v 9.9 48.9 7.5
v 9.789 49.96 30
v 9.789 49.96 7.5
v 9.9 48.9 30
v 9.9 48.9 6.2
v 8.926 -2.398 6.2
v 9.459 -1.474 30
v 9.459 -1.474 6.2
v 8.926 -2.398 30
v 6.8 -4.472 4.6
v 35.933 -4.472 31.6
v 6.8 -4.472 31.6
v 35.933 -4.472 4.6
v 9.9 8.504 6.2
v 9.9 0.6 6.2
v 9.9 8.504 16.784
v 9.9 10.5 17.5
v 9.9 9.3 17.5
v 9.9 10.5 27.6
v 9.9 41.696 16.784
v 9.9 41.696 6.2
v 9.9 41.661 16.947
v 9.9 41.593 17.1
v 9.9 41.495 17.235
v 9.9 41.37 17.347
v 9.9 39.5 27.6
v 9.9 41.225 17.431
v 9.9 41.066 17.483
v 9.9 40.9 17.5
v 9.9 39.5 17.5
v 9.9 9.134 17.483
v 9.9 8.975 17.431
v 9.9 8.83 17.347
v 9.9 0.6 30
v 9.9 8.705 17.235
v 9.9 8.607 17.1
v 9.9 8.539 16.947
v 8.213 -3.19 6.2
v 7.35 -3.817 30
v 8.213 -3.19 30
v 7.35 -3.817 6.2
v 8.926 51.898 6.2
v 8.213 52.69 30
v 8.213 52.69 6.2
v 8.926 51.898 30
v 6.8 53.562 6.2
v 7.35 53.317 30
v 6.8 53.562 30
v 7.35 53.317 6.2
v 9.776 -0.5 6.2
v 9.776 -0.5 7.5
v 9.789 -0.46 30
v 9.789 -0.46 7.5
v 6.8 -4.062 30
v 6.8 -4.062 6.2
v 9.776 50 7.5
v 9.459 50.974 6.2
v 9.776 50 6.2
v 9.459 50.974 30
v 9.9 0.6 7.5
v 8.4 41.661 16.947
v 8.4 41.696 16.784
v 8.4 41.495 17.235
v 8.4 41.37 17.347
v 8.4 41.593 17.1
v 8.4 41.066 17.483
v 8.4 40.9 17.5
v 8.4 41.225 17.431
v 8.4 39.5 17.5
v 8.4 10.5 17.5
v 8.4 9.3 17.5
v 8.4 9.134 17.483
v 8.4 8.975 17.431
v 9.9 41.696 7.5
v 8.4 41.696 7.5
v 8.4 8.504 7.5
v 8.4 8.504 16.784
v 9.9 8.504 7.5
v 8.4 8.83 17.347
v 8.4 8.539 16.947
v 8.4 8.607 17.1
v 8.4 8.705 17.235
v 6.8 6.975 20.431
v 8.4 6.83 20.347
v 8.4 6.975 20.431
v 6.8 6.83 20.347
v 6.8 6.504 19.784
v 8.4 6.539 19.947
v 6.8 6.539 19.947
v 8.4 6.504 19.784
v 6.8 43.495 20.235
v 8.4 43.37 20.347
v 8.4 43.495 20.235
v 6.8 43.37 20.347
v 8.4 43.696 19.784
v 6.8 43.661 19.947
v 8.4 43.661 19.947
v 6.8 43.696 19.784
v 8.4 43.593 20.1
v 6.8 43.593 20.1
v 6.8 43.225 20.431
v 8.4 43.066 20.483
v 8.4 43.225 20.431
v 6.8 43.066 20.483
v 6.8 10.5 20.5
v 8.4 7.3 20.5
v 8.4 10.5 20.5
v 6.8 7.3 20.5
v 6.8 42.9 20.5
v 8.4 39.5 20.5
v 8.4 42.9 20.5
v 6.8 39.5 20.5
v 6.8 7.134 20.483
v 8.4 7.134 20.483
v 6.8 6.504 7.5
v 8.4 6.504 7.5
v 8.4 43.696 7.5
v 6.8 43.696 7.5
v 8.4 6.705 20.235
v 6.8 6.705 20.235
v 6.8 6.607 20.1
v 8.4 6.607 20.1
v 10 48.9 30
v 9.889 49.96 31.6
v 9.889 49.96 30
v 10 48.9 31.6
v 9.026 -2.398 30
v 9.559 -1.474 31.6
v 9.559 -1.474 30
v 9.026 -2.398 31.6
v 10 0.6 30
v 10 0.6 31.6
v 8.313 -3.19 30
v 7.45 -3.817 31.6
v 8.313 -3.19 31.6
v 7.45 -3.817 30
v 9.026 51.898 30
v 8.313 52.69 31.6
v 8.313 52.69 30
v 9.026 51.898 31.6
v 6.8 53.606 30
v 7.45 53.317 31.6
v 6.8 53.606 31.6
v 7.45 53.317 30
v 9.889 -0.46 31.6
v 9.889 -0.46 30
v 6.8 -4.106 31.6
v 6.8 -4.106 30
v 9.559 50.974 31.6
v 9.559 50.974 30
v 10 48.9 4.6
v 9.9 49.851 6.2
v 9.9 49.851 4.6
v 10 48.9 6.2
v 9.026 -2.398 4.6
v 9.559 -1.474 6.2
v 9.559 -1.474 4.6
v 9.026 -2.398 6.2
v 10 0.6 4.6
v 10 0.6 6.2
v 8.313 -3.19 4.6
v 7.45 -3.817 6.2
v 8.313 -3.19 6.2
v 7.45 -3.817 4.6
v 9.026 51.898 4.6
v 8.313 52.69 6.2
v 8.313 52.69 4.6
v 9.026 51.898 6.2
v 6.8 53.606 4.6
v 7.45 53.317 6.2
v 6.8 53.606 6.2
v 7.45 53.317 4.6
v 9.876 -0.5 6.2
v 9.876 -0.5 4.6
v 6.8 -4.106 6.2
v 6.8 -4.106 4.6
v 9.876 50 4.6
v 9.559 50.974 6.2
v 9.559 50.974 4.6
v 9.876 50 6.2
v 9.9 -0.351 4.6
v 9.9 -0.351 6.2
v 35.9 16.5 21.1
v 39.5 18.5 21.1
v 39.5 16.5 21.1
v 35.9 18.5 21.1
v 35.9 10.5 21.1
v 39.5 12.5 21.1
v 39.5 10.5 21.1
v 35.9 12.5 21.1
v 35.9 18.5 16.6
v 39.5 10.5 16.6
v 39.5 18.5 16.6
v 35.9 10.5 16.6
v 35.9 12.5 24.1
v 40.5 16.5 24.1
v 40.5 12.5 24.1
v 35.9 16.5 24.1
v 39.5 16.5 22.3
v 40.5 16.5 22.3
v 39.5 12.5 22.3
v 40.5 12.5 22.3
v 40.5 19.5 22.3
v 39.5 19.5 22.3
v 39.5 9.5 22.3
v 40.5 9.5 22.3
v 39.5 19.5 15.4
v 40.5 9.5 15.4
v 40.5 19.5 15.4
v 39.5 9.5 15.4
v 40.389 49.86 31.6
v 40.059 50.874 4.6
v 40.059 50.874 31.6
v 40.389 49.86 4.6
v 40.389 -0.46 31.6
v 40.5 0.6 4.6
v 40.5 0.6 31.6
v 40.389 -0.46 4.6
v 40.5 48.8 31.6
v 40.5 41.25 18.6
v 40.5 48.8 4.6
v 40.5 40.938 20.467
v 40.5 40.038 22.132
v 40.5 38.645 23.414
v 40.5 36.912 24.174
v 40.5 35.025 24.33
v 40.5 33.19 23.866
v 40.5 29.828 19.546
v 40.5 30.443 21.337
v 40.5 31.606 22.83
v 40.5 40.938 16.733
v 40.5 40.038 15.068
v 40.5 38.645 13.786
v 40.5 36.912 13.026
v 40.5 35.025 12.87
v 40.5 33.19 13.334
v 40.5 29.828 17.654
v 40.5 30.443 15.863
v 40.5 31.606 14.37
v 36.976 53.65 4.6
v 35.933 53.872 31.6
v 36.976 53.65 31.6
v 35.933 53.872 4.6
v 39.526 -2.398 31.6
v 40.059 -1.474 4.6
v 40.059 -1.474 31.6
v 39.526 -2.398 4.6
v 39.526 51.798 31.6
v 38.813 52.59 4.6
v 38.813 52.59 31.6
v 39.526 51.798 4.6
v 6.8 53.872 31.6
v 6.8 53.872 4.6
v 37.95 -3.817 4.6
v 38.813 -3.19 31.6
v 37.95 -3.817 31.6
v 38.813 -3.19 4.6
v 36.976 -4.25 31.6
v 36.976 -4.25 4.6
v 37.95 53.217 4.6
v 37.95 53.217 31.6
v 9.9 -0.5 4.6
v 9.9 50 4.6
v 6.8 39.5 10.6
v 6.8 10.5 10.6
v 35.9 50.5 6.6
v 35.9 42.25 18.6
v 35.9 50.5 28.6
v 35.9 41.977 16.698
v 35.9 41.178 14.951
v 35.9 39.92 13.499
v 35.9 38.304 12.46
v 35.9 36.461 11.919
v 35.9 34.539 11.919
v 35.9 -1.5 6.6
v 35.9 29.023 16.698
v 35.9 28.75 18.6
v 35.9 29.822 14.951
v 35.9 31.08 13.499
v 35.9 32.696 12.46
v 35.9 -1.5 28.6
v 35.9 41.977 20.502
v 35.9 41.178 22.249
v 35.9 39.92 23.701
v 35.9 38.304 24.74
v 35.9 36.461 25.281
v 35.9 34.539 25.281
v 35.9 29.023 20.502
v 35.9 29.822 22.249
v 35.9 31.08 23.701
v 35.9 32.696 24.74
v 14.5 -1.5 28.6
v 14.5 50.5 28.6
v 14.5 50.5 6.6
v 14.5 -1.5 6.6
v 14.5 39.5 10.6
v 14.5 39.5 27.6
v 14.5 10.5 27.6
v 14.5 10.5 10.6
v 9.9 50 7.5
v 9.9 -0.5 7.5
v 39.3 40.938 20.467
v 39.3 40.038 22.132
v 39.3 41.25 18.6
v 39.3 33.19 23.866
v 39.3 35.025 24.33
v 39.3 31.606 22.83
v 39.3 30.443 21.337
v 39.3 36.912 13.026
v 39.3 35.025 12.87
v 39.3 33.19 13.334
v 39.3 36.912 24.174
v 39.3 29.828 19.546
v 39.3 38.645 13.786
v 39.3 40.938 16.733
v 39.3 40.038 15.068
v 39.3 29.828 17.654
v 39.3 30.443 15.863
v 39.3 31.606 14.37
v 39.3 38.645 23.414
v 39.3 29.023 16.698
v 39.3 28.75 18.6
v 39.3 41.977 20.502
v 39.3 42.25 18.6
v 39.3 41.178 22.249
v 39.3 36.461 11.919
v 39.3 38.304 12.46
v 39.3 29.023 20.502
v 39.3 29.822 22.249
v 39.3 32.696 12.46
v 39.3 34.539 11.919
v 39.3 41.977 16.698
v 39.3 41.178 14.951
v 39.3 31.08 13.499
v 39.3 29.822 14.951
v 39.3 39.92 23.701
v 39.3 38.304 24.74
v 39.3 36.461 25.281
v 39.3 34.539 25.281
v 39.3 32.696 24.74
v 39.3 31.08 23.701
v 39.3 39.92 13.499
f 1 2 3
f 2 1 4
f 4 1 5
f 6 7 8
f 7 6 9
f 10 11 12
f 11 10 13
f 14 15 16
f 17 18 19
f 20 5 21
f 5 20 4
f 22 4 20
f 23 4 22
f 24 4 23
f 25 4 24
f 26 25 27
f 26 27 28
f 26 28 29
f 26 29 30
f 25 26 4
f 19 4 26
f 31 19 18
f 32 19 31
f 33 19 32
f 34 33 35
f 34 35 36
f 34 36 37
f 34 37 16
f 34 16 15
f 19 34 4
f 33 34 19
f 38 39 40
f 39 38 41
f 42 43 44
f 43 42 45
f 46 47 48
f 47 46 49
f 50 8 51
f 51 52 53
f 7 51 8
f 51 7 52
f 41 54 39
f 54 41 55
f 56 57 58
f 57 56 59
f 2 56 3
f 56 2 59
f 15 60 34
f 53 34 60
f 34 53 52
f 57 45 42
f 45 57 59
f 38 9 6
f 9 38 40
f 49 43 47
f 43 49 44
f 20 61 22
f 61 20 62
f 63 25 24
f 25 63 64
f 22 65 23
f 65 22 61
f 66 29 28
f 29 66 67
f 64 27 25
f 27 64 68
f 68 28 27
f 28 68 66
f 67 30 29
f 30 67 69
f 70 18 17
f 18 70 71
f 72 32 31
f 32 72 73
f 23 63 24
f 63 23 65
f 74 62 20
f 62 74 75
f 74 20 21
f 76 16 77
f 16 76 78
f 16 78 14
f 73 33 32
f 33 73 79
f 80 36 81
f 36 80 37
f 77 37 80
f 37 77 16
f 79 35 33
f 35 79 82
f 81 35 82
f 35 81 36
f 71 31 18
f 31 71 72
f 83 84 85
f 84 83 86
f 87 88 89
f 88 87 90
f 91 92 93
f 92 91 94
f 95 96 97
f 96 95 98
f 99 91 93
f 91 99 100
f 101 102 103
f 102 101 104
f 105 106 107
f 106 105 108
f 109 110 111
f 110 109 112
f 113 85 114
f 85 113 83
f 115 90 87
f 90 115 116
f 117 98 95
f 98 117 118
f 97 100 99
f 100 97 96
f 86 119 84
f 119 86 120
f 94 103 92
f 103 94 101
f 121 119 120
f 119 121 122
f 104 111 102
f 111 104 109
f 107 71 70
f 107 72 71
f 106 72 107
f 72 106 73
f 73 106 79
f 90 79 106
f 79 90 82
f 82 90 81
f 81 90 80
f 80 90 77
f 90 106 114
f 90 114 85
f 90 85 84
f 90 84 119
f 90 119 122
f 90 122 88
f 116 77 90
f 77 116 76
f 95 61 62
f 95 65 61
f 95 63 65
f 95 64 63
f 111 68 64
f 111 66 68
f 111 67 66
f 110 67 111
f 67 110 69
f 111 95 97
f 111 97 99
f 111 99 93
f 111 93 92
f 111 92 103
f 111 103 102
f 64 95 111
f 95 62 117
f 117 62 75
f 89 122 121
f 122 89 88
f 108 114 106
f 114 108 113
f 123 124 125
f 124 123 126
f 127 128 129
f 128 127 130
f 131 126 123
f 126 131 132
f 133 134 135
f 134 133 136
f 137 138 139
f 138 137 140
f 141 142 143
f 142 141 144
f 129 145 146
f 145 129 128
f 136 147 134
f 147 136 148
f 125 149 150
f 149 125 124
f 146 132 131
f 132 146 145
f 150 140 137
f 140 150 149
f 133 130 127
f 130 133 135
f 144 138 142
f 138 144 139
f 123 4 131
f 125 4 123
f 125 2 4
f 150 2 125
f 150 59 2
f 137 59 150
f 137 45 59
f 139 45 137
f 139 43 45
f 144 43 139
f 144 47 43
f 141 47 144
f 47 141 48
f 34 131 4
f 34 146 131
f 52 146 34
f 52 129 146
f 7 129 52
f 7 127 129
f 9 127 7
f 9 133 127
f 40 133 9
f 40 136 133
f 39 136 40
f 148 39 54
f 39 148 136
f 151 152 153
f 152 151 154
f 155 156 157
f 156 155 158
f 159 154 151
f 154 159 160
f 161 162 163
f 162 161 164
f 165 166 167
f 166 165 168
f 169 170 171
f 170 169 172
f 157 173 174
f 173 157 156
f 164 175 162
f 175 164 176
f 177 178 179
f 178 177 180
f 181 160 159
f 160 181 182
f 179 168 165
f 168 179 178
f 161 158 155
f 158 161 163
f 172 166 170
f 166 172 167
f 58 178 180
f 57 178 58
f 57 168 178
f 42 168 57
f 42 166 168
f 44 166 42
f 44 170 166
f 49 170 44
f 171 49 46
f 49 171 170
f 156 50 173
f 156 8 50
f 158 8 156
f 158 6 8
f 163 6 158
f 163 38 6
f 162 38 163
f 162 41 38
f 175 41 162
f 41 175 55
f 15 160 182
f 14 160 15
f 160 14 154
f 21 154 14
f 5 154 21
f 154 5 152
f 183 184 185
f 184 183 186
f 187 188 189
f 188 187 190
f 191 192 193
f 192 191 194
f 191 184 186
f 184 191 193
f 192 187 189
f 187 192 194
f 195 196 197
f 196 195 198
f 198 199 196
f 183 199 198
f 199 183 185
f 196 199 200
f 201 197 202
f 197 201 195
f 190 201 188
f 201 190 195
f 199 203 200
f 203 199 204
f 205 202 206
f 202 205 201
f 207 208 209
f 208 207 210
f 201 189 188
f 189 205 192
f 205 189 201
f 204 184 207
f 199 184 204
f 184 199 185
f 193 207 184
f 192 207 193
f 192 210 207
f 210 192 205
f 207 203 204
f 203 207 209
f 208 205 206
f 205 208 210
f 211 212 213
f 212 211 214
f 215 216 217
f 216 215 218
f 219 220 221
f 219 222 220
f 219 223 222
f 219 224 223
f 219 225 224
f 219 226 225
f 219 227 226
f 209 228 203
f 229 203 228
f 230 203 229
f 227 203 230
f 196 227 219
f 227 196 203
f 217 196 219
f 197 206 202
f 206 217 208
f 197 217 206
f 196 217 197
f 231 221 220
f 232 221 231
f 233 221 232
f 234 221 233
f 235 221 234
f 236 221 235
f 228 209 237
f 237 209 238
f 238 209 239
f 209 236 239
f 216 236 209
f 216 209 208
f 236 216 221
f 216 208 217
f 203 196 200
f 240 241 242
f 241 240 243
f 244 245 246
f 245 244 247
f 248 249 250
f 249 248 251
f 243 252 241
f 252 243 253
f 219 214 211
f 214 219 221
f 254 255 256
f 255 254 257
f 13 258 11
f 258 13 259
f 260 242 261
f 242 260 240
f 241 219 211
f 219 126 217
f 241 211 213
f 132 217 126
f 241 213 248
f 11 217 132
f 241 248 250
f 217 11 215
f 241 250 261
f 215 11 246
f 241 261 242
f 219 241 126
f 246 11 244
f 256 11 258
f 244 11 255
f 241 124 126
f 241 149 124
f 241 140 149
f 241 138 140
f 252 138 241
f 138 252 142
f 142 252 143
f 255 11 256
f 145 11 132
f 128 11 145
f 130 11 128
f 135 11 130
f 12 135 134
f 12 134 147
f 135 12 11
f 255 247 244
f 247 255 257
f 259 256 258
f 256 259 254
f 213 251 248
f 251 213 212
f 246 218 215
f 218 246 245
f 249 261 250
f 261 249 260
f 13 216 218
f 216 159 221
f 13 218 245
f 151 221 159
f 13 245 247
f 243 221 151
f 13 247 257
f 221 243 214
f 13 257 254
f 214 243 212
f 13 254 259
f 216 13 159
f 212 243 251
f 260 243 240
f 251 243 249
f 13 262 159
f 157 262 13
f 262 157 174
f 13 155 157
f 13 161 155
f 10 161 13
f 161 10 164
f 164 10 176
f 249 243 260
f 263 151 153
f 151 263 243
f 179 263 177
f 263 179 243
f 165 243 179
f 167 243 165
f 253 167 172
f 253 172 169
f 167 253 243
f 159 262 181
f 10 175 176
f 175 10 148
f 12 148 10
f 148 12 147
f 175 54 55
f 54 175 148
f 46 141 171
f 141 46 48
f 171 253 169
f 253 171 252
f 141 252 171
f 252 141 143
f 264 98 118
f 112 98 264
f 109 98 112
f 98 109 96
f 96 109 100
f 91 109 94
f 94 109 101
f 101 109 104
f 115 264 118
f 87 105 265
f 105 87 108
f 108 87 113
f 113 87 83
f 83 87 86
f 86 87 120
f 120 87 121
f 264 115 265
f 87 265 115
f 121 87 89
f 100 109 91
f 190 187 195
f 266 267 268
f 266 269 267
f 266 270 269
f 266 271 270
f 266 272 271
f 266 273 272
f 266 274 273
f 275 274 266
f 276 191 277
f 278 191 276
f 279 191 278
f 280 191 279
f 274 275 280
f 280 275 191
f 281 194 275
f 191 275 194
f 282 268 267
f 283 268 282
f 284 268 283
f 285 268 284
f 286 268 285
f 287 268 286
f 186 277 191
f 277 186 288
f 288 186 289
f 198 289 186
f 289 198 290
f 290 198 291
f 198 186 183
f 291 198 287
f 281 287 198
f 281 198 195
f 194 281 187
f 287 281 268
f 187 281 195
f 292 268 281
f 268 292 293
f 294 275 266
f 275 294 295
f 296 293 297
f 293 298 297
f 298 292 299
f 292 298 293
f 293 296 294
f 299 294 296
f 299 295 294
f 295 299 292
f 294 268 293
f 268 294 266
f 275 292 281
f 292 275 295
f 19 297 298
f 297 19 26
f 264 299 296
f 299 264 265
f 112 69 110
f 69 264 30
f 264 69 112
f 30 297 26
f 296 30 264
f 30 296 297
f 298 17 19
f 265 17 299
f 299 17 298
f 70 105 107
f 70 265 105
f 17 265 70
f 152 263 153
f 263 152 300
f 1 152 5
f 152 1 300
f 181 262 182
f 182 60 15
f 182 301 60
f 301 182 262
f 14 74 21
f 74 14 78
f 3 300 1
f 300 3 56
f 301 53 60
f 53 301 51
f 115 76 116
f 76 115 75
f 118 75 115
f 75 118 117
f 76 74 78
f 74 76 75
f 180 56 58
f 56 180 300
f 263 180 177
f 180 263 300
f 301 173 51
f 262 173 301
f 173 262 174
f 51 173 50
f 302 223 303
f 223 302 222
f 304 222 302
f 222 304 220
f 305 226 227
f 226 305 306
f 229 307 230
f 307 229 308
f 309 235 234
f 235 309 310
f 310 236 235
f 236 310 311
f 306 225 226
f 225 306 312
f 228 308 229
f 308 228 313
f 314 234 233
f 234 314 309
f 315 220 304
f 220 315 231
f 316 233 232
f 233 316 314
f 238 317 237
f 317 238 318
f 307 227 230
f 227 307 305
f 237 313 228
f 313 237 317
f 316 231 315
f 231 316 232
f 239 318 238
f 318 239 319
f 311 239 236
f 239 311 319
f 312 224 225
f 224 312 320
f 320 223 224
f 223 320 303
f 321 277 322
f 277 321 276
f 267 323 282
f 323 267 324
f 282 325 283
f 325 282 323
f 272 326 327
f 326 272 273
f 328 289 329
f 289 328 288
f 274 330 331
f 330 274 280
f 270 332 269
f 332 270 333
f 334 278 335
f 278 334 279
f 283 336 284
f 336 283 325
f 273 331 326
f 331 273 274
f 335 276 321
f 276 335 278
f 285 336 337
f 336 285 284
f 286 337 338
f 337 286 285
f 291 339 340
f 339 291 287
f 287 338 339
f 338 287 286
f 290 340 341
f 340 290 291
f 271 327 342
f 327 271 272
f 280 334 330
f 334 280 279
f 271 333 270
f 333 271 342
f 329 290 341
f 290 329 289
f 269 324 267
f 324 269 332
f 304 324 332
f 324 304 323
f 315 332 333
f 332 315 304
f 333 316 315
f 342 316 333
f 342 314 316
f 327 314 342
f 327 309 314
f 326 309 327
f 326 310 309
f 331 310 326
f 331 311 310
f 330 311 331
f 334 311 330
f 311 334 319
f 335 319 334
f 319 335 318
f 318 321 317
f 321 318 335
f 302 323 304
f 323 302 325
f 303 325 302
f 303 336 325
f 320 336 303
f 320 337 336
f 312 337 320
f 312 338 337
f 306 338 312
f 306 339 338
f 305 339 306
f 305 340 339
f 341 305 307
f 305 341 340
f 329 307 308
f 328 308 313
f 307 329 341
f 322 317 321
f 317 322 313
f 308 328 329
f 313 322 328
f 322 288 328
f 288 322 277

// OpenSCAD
// file: wled_shield_case.scad
/*
  All components for the wled shield case
*/
// Rednerquality 0.01 for print 0.9 for dev
$fs = 0.01;

use <_item_lid.scad>;
translate([4,4,0])
lid();

use <_item_case.scad>;
translate([-4,4,0])
case();

use <_item_wirebox.scad>;
translate([-40,-55,-4])

wirebox();
// file: _item_lid.scad
/*
 The lid for the case
*/
use <cuberounded.scad>

module picker(stick=false){
  translate([8.5,2.5,8])
  union(){
    rotate([180,0,0])
    cylinder(4.5,1.8,0.5);
    
    if (stick){
      translate([0,0,-2.5])
      cylinder(h=24.0,r=2.3);
      
      translate([0,0,17.5])
      cylinder(h=4.1,r=5.3);
    }
  }
}

module anchor(m=false,length=10.2,size=3.5){
  difference(){
    cube([length-0.2,size-0.2,size-0.2]);

    translate([m?length:-0.1,m?0:size-0.1,m?0:-0.1])
    rotate([m?0:180,-90,0])
    linear_extrude(length)
    polygon(points=[[0,0],[size,size],[0,size]],paths=[[0,1,2]],convexity=1);
  }
}


module opener(){
  cube([11,4,2.3]);
  
  translate([0,53,-0.1])
  cube([11,5,2.3]);
}

module snaphelper(){
  translate([20,3.4,-1.3])
  union(){
    cube([9.8,48.4,2.5]);
    
    translate([25,0,0])
    cube([9.8,48.4,2.5]);
  }
}

module backlid_snapins(){
  translate([20,1.4,-1.3])
  union(){
    backlid_snapinset_rl();
    
    translate([25,0,0])
    backlid_snapinset_rl();
  }
}

module backlid_snapinset_rl(){
  anchor();
  
  translate([0,50.1,0])
  anchor(m=true);
}

module prelid(){
  translate([2.6,2.6,-7.5])
  difference(){
    cuberounded([71.1,50,5],4.1);
    
    translate([-0.1,-0.1,-8.8])
    cube([72,52,12.2]);
    
    translate([65,32,4])
    rotate([180,0,0])
    linear_extrude(2)
    text("WLED",15,font="Liberation Sans:style=Bold",halign="right");
  }
  
  backlid_snapins();
  
  color("azure",0.15)
  snaphelper();
  
  translate([0,0,-28.6])
  difference(){
    cuberounded([76,54.5,27],5.1);
    
    translate([-0.1,-0.1,-2])
    cuberounded([76.2,54.7,27],5.1);
    
    translate([19.5,-0.2,24.9])
      union(){
        opener();
        
        translate([25,0,0])
        opener();
      }
  }
}

module lid(){
  translate([0,0.1,4])
  difference(){
    prelid();
    
    translate([4.2,4.2,5])
    cuberounded([68,46,2],5.1);
  }
}

lid();
// file: cuberounded.scad
module cuberounded(size=[1,1,1],radius=1,xonly=false){
  size=(size[0]==undef)?[size,size,size]:size;
  
  translate_min=radius;
  translate_xmax=size[0]-radius;
  translate_ymax=size[1]-radius;
  translate_zmax=size[2]-radius;
  
  hull()
  for (translate_x=[translate_min,translate_xmax]){
    for (translate_y=[translate_min,translate_ymax]){
      for (translate_z=[translate_min,translate_zmax]){
        translate([translate_x,translate_y,translate_z])
        rotate((xonly==true)?[0,90,0]:[0,0,0])
        cylinder(h=radius*2,r=radius,center=true);
      }
    }
  }
}

include <wled_shield_case.scad>
// file: _item_case.scad
/*
 The box for the first versions of wled shield case
*/
use <_item_lid.scad>
use <cuberounded.scad>

module sidestickholder(){
  translate([5,-1,7.5])
  cube([6.5,2,18.5]);
  
  translate([62.7,-1,6.4])
  cube([5,2,19]);
}

module pickers(sticks=false){
  picker(sticks);

  translate([0,41.2,0])
  picker(sticks);

  translate([56.2,0.2,0])
  picker(sticks);

  translate([56.2,41.2,0])
  picker(sticks);
}

module picker(stick=false){
  translate([8.5,2.5,8])
  union(){
    rotate([180,0,0])
    cylinder(4.5,1.8,0.5);
    
    if (stick){
      translate([0,0,-1.5])
      cylinder(h=20.0,r=2.3);
      
      translate([0,0,17.5])
      cylinder(h=1,r=5.3);
    }
  }
}

module fixinghole(){
  union(){
    cylinder(1.4,3.2,3.2);
    
    translate([0,0,1.0])
    cylinder(1.1,2.8,2.8);
    
    translate([0,0,3.-1])
    cylinder(1.4,2.3,2.3);
    
    translate([0,0,3.0])
    cylinder(1.4,3.2,3.2);
  }
}

module mesh(size=[1,1,1]){
  size=(size[0]==undef) ? [size,size,size] : size;
  
  linear_extrude(size[2])
  for(rx=[0:size[0]-1]){
    translate([rx*4,,0])
    for(ry=[0:size[1]-1]){
      translate([0,ry*9,0])
      union(){
        polygon(points=[[0,0],[3,0],[0,3]],paths=[[0,1,2]],convexity=10);
        
        translate([0,1,0])
        polygon(points=[[3,3],[0,3],[3,0]],paths=[[0,1,2]],convexity=10);
        
        translate([0,5,0])
        polygon(points=[[3,3],[3,0],[0,0]],paths=[[0,1,2]],convexity=10);
        
        translate([0,6,0])
        polygon(points=[[0,0],[3,3],[0,3]],paths=[[0,1,2]],convexity=10);
      }
    }
  }
}

module wireholes(){
  fixinghole();

  translate([0,5,0])
  fixinghole();

  translate([0,10,0])
  fixinghole();

  translate([0,15,0])
  fixinghole();

  translate([0,20,0])
  fixinghole();

  translate([0,25,0])
  fixinghole();
}

module thebox(){
  
  sidestickholder();
  
  translate([0,46.2,0])
  sidestickholder();
  
  pickers(sticks=true);
  
  translate([-4.5,-4.5,4.6])
  difference(){
    // The BOX
    translate([-2,-2,-2])
    cuberounded([80,58.5,27],5.1);
    
    // Space for the lid
    prelid();
    
    // Inner Grind
    translate([3.4,3.4,-1]) 
    cuberounded([69.4,48.4,22.5],4.1);
    
    // Frontside cabel injection hole 
    translate([72,11,-4])
    cuberounded([7,33.2,14.9],0.8,true);
    
    // Frontside cabel injection hole 
    translate([74.5,9,-3])
    cuberounded([2.0,37.2,16.9],0.8,true);
    
    // Backside ventilation
    translate([3.5,10,0])
    rotate([-90,-90,90])
    scale([2,2,1.5])
    mesh([3,2,4]);
    
    // Leftside inner tag WLED
    translate([66.6,3.7,4])
    rotate([90,0,0])
    linear_extrude(0.5)
    text("WLED",15,font="Liberation Sans:style=Bold",halign="right");
    
    // Leftside outside tag WLED
    translate([69.6,-1.5,3.4])
    rotate([90,0,0])
    linear_extrude(0.5)
    text("WLED",15,font="Liberation Sans:style=Bold",halign="right");
    
    translate([4.5,4.5,-5])
    union(){
      // Button hole
      translate([31.8,53,22.5])
      rotate([90,90,0])
      cylinder(h=4,r1=2,r2=2.4);
      translate([27.5,50,27.3])
      rotate([90,90,0])
      cube([9,9,4.5]);
      
      // wire attachments
      translate([58.5,9.7,26.0])
      wireholes();
      
      //displaywindow inner
      translate([-2.2,-1.6,0])
      translate([12.7,9.4,26.4])
      cuberounded([14,30.5,2],0.4);
      cube(0);
      
      //displaywindow outer
      translate([-2.2,-1.6,0])
      translate([13.3,11.6,26.4])
      cuberounded([13,27.5,4],0.5);
      cube(0);
      
      // mesh below display
      translate([2,0,0])
      translate([27.7,1,26.4])
      scale([1.5,1.65,1.5])
      mesh([1,3,4]);
      
      // mesh below display line 2
      translate([13,44.6,0])
      translate([27.7,1,26.4])
      scale([1.5,1.65,1.5])
      rotate([0,0,180])
      mesh([1,3,4]);
      
      // mesh on top of display
      translate([1,1,26.4])
      mesh([1,5,4]);
      
      // Signes for holes
      translate([48,8,29.3])
      linear_extrude(3)
      union(){
        translate([21,0,0])
        rotate([0,0,90])
        text("IN",6,font="Liberation Sans:style=Bold");
        
        translate([20.5,8.4,0])
        rotate([0,0,90])
        text("|",6,font="Liberation Sans:style=Bold");
        
        translate([21,11.6,0])
        rotate([0,0,90])
        text("LED",6,font="Liberation Sans:style=Bold");
        
        translate([7,0,0])
        text("PWR",4,font="Liberation Sans:style=Bold",halign="right");
        
        translate([7,5.1,0])
        text("GND",4,font="Liberation Sans:style=Bold",halign="right");
        
        translate([7,10.2,0])
        text("GND",4,font="Liberation Sans:style=Bold",halign="right");
        
        translate([7,15.3,0])
        text("5V",4,font="Liberation Sans:style=Bold",halign="right");
        
        translate([7,20.4,0])
        text("CLK",4,font="Liberation Sans:style=Bold",halign="right");
        
        translate([7,25.5,0])
        text("Data",4,font="Liberation Sans:style=Bold",halign="right");
      }
    }
  }
}

module case(){
  translate([-4.5,4.5,29.6])
  rotate([0,180,0])
  thebox();
}

case();
// main file
/*
 The optional box for power and neopixeljack
*/
use <_item_case.scad>
use <cuberounded.scad>

module wirebox(){
  translate([-4.5,-4.5,4.6])
  union(){
    difference(){
      cuberounded([45.0,58.4,27],5.1);
      
      //removes box attachment with a small gap
      translate([-59.1,6.5,-2.6])
      thebox();
      
      //removes box attachment with offset for top
      translate([-59,6.5,55])
      mirror([0,0,1])
      thebox();
      
      //removes box attachment with offset for bottom
      translate([-59,6.5,-28])
      thebox();
      
      // removes box inner negative
      translate([-0.1,0,-0.1])
      cube([11.4,58.6,27.5]);
      
      // innerspace
      translate([19,3,2])
      cube([21.4,52,22]);
      
      translate([0,15,6])
      cube([20,29,17]);
      
      
      translate([0,4,-0.1])
      cube([14.4,50.5,3]);
      
      // Power hole
      translate([43.6,40,14])
      //11.5
      rotate([90,0,90])
      cylinder(r=5.75,h=1.5);
      
      // Power hole inner
      translate([40.3,40,14])
      //11.5
      rotate([90,0,90])
      cylinder(r=6.75,h=3.5);
      
      // Neopixeljack
      translate([40.3,15,12])
      union(){
        cube([4.8,8,4.5]);
        
        translate([0,2,0])
        cube([4.8,4,7.5]);
        
        translate([3.7,-1,-1.2])
        cube([1.1,10,6.9]);
      }
    }
  }
}

wirebox();
